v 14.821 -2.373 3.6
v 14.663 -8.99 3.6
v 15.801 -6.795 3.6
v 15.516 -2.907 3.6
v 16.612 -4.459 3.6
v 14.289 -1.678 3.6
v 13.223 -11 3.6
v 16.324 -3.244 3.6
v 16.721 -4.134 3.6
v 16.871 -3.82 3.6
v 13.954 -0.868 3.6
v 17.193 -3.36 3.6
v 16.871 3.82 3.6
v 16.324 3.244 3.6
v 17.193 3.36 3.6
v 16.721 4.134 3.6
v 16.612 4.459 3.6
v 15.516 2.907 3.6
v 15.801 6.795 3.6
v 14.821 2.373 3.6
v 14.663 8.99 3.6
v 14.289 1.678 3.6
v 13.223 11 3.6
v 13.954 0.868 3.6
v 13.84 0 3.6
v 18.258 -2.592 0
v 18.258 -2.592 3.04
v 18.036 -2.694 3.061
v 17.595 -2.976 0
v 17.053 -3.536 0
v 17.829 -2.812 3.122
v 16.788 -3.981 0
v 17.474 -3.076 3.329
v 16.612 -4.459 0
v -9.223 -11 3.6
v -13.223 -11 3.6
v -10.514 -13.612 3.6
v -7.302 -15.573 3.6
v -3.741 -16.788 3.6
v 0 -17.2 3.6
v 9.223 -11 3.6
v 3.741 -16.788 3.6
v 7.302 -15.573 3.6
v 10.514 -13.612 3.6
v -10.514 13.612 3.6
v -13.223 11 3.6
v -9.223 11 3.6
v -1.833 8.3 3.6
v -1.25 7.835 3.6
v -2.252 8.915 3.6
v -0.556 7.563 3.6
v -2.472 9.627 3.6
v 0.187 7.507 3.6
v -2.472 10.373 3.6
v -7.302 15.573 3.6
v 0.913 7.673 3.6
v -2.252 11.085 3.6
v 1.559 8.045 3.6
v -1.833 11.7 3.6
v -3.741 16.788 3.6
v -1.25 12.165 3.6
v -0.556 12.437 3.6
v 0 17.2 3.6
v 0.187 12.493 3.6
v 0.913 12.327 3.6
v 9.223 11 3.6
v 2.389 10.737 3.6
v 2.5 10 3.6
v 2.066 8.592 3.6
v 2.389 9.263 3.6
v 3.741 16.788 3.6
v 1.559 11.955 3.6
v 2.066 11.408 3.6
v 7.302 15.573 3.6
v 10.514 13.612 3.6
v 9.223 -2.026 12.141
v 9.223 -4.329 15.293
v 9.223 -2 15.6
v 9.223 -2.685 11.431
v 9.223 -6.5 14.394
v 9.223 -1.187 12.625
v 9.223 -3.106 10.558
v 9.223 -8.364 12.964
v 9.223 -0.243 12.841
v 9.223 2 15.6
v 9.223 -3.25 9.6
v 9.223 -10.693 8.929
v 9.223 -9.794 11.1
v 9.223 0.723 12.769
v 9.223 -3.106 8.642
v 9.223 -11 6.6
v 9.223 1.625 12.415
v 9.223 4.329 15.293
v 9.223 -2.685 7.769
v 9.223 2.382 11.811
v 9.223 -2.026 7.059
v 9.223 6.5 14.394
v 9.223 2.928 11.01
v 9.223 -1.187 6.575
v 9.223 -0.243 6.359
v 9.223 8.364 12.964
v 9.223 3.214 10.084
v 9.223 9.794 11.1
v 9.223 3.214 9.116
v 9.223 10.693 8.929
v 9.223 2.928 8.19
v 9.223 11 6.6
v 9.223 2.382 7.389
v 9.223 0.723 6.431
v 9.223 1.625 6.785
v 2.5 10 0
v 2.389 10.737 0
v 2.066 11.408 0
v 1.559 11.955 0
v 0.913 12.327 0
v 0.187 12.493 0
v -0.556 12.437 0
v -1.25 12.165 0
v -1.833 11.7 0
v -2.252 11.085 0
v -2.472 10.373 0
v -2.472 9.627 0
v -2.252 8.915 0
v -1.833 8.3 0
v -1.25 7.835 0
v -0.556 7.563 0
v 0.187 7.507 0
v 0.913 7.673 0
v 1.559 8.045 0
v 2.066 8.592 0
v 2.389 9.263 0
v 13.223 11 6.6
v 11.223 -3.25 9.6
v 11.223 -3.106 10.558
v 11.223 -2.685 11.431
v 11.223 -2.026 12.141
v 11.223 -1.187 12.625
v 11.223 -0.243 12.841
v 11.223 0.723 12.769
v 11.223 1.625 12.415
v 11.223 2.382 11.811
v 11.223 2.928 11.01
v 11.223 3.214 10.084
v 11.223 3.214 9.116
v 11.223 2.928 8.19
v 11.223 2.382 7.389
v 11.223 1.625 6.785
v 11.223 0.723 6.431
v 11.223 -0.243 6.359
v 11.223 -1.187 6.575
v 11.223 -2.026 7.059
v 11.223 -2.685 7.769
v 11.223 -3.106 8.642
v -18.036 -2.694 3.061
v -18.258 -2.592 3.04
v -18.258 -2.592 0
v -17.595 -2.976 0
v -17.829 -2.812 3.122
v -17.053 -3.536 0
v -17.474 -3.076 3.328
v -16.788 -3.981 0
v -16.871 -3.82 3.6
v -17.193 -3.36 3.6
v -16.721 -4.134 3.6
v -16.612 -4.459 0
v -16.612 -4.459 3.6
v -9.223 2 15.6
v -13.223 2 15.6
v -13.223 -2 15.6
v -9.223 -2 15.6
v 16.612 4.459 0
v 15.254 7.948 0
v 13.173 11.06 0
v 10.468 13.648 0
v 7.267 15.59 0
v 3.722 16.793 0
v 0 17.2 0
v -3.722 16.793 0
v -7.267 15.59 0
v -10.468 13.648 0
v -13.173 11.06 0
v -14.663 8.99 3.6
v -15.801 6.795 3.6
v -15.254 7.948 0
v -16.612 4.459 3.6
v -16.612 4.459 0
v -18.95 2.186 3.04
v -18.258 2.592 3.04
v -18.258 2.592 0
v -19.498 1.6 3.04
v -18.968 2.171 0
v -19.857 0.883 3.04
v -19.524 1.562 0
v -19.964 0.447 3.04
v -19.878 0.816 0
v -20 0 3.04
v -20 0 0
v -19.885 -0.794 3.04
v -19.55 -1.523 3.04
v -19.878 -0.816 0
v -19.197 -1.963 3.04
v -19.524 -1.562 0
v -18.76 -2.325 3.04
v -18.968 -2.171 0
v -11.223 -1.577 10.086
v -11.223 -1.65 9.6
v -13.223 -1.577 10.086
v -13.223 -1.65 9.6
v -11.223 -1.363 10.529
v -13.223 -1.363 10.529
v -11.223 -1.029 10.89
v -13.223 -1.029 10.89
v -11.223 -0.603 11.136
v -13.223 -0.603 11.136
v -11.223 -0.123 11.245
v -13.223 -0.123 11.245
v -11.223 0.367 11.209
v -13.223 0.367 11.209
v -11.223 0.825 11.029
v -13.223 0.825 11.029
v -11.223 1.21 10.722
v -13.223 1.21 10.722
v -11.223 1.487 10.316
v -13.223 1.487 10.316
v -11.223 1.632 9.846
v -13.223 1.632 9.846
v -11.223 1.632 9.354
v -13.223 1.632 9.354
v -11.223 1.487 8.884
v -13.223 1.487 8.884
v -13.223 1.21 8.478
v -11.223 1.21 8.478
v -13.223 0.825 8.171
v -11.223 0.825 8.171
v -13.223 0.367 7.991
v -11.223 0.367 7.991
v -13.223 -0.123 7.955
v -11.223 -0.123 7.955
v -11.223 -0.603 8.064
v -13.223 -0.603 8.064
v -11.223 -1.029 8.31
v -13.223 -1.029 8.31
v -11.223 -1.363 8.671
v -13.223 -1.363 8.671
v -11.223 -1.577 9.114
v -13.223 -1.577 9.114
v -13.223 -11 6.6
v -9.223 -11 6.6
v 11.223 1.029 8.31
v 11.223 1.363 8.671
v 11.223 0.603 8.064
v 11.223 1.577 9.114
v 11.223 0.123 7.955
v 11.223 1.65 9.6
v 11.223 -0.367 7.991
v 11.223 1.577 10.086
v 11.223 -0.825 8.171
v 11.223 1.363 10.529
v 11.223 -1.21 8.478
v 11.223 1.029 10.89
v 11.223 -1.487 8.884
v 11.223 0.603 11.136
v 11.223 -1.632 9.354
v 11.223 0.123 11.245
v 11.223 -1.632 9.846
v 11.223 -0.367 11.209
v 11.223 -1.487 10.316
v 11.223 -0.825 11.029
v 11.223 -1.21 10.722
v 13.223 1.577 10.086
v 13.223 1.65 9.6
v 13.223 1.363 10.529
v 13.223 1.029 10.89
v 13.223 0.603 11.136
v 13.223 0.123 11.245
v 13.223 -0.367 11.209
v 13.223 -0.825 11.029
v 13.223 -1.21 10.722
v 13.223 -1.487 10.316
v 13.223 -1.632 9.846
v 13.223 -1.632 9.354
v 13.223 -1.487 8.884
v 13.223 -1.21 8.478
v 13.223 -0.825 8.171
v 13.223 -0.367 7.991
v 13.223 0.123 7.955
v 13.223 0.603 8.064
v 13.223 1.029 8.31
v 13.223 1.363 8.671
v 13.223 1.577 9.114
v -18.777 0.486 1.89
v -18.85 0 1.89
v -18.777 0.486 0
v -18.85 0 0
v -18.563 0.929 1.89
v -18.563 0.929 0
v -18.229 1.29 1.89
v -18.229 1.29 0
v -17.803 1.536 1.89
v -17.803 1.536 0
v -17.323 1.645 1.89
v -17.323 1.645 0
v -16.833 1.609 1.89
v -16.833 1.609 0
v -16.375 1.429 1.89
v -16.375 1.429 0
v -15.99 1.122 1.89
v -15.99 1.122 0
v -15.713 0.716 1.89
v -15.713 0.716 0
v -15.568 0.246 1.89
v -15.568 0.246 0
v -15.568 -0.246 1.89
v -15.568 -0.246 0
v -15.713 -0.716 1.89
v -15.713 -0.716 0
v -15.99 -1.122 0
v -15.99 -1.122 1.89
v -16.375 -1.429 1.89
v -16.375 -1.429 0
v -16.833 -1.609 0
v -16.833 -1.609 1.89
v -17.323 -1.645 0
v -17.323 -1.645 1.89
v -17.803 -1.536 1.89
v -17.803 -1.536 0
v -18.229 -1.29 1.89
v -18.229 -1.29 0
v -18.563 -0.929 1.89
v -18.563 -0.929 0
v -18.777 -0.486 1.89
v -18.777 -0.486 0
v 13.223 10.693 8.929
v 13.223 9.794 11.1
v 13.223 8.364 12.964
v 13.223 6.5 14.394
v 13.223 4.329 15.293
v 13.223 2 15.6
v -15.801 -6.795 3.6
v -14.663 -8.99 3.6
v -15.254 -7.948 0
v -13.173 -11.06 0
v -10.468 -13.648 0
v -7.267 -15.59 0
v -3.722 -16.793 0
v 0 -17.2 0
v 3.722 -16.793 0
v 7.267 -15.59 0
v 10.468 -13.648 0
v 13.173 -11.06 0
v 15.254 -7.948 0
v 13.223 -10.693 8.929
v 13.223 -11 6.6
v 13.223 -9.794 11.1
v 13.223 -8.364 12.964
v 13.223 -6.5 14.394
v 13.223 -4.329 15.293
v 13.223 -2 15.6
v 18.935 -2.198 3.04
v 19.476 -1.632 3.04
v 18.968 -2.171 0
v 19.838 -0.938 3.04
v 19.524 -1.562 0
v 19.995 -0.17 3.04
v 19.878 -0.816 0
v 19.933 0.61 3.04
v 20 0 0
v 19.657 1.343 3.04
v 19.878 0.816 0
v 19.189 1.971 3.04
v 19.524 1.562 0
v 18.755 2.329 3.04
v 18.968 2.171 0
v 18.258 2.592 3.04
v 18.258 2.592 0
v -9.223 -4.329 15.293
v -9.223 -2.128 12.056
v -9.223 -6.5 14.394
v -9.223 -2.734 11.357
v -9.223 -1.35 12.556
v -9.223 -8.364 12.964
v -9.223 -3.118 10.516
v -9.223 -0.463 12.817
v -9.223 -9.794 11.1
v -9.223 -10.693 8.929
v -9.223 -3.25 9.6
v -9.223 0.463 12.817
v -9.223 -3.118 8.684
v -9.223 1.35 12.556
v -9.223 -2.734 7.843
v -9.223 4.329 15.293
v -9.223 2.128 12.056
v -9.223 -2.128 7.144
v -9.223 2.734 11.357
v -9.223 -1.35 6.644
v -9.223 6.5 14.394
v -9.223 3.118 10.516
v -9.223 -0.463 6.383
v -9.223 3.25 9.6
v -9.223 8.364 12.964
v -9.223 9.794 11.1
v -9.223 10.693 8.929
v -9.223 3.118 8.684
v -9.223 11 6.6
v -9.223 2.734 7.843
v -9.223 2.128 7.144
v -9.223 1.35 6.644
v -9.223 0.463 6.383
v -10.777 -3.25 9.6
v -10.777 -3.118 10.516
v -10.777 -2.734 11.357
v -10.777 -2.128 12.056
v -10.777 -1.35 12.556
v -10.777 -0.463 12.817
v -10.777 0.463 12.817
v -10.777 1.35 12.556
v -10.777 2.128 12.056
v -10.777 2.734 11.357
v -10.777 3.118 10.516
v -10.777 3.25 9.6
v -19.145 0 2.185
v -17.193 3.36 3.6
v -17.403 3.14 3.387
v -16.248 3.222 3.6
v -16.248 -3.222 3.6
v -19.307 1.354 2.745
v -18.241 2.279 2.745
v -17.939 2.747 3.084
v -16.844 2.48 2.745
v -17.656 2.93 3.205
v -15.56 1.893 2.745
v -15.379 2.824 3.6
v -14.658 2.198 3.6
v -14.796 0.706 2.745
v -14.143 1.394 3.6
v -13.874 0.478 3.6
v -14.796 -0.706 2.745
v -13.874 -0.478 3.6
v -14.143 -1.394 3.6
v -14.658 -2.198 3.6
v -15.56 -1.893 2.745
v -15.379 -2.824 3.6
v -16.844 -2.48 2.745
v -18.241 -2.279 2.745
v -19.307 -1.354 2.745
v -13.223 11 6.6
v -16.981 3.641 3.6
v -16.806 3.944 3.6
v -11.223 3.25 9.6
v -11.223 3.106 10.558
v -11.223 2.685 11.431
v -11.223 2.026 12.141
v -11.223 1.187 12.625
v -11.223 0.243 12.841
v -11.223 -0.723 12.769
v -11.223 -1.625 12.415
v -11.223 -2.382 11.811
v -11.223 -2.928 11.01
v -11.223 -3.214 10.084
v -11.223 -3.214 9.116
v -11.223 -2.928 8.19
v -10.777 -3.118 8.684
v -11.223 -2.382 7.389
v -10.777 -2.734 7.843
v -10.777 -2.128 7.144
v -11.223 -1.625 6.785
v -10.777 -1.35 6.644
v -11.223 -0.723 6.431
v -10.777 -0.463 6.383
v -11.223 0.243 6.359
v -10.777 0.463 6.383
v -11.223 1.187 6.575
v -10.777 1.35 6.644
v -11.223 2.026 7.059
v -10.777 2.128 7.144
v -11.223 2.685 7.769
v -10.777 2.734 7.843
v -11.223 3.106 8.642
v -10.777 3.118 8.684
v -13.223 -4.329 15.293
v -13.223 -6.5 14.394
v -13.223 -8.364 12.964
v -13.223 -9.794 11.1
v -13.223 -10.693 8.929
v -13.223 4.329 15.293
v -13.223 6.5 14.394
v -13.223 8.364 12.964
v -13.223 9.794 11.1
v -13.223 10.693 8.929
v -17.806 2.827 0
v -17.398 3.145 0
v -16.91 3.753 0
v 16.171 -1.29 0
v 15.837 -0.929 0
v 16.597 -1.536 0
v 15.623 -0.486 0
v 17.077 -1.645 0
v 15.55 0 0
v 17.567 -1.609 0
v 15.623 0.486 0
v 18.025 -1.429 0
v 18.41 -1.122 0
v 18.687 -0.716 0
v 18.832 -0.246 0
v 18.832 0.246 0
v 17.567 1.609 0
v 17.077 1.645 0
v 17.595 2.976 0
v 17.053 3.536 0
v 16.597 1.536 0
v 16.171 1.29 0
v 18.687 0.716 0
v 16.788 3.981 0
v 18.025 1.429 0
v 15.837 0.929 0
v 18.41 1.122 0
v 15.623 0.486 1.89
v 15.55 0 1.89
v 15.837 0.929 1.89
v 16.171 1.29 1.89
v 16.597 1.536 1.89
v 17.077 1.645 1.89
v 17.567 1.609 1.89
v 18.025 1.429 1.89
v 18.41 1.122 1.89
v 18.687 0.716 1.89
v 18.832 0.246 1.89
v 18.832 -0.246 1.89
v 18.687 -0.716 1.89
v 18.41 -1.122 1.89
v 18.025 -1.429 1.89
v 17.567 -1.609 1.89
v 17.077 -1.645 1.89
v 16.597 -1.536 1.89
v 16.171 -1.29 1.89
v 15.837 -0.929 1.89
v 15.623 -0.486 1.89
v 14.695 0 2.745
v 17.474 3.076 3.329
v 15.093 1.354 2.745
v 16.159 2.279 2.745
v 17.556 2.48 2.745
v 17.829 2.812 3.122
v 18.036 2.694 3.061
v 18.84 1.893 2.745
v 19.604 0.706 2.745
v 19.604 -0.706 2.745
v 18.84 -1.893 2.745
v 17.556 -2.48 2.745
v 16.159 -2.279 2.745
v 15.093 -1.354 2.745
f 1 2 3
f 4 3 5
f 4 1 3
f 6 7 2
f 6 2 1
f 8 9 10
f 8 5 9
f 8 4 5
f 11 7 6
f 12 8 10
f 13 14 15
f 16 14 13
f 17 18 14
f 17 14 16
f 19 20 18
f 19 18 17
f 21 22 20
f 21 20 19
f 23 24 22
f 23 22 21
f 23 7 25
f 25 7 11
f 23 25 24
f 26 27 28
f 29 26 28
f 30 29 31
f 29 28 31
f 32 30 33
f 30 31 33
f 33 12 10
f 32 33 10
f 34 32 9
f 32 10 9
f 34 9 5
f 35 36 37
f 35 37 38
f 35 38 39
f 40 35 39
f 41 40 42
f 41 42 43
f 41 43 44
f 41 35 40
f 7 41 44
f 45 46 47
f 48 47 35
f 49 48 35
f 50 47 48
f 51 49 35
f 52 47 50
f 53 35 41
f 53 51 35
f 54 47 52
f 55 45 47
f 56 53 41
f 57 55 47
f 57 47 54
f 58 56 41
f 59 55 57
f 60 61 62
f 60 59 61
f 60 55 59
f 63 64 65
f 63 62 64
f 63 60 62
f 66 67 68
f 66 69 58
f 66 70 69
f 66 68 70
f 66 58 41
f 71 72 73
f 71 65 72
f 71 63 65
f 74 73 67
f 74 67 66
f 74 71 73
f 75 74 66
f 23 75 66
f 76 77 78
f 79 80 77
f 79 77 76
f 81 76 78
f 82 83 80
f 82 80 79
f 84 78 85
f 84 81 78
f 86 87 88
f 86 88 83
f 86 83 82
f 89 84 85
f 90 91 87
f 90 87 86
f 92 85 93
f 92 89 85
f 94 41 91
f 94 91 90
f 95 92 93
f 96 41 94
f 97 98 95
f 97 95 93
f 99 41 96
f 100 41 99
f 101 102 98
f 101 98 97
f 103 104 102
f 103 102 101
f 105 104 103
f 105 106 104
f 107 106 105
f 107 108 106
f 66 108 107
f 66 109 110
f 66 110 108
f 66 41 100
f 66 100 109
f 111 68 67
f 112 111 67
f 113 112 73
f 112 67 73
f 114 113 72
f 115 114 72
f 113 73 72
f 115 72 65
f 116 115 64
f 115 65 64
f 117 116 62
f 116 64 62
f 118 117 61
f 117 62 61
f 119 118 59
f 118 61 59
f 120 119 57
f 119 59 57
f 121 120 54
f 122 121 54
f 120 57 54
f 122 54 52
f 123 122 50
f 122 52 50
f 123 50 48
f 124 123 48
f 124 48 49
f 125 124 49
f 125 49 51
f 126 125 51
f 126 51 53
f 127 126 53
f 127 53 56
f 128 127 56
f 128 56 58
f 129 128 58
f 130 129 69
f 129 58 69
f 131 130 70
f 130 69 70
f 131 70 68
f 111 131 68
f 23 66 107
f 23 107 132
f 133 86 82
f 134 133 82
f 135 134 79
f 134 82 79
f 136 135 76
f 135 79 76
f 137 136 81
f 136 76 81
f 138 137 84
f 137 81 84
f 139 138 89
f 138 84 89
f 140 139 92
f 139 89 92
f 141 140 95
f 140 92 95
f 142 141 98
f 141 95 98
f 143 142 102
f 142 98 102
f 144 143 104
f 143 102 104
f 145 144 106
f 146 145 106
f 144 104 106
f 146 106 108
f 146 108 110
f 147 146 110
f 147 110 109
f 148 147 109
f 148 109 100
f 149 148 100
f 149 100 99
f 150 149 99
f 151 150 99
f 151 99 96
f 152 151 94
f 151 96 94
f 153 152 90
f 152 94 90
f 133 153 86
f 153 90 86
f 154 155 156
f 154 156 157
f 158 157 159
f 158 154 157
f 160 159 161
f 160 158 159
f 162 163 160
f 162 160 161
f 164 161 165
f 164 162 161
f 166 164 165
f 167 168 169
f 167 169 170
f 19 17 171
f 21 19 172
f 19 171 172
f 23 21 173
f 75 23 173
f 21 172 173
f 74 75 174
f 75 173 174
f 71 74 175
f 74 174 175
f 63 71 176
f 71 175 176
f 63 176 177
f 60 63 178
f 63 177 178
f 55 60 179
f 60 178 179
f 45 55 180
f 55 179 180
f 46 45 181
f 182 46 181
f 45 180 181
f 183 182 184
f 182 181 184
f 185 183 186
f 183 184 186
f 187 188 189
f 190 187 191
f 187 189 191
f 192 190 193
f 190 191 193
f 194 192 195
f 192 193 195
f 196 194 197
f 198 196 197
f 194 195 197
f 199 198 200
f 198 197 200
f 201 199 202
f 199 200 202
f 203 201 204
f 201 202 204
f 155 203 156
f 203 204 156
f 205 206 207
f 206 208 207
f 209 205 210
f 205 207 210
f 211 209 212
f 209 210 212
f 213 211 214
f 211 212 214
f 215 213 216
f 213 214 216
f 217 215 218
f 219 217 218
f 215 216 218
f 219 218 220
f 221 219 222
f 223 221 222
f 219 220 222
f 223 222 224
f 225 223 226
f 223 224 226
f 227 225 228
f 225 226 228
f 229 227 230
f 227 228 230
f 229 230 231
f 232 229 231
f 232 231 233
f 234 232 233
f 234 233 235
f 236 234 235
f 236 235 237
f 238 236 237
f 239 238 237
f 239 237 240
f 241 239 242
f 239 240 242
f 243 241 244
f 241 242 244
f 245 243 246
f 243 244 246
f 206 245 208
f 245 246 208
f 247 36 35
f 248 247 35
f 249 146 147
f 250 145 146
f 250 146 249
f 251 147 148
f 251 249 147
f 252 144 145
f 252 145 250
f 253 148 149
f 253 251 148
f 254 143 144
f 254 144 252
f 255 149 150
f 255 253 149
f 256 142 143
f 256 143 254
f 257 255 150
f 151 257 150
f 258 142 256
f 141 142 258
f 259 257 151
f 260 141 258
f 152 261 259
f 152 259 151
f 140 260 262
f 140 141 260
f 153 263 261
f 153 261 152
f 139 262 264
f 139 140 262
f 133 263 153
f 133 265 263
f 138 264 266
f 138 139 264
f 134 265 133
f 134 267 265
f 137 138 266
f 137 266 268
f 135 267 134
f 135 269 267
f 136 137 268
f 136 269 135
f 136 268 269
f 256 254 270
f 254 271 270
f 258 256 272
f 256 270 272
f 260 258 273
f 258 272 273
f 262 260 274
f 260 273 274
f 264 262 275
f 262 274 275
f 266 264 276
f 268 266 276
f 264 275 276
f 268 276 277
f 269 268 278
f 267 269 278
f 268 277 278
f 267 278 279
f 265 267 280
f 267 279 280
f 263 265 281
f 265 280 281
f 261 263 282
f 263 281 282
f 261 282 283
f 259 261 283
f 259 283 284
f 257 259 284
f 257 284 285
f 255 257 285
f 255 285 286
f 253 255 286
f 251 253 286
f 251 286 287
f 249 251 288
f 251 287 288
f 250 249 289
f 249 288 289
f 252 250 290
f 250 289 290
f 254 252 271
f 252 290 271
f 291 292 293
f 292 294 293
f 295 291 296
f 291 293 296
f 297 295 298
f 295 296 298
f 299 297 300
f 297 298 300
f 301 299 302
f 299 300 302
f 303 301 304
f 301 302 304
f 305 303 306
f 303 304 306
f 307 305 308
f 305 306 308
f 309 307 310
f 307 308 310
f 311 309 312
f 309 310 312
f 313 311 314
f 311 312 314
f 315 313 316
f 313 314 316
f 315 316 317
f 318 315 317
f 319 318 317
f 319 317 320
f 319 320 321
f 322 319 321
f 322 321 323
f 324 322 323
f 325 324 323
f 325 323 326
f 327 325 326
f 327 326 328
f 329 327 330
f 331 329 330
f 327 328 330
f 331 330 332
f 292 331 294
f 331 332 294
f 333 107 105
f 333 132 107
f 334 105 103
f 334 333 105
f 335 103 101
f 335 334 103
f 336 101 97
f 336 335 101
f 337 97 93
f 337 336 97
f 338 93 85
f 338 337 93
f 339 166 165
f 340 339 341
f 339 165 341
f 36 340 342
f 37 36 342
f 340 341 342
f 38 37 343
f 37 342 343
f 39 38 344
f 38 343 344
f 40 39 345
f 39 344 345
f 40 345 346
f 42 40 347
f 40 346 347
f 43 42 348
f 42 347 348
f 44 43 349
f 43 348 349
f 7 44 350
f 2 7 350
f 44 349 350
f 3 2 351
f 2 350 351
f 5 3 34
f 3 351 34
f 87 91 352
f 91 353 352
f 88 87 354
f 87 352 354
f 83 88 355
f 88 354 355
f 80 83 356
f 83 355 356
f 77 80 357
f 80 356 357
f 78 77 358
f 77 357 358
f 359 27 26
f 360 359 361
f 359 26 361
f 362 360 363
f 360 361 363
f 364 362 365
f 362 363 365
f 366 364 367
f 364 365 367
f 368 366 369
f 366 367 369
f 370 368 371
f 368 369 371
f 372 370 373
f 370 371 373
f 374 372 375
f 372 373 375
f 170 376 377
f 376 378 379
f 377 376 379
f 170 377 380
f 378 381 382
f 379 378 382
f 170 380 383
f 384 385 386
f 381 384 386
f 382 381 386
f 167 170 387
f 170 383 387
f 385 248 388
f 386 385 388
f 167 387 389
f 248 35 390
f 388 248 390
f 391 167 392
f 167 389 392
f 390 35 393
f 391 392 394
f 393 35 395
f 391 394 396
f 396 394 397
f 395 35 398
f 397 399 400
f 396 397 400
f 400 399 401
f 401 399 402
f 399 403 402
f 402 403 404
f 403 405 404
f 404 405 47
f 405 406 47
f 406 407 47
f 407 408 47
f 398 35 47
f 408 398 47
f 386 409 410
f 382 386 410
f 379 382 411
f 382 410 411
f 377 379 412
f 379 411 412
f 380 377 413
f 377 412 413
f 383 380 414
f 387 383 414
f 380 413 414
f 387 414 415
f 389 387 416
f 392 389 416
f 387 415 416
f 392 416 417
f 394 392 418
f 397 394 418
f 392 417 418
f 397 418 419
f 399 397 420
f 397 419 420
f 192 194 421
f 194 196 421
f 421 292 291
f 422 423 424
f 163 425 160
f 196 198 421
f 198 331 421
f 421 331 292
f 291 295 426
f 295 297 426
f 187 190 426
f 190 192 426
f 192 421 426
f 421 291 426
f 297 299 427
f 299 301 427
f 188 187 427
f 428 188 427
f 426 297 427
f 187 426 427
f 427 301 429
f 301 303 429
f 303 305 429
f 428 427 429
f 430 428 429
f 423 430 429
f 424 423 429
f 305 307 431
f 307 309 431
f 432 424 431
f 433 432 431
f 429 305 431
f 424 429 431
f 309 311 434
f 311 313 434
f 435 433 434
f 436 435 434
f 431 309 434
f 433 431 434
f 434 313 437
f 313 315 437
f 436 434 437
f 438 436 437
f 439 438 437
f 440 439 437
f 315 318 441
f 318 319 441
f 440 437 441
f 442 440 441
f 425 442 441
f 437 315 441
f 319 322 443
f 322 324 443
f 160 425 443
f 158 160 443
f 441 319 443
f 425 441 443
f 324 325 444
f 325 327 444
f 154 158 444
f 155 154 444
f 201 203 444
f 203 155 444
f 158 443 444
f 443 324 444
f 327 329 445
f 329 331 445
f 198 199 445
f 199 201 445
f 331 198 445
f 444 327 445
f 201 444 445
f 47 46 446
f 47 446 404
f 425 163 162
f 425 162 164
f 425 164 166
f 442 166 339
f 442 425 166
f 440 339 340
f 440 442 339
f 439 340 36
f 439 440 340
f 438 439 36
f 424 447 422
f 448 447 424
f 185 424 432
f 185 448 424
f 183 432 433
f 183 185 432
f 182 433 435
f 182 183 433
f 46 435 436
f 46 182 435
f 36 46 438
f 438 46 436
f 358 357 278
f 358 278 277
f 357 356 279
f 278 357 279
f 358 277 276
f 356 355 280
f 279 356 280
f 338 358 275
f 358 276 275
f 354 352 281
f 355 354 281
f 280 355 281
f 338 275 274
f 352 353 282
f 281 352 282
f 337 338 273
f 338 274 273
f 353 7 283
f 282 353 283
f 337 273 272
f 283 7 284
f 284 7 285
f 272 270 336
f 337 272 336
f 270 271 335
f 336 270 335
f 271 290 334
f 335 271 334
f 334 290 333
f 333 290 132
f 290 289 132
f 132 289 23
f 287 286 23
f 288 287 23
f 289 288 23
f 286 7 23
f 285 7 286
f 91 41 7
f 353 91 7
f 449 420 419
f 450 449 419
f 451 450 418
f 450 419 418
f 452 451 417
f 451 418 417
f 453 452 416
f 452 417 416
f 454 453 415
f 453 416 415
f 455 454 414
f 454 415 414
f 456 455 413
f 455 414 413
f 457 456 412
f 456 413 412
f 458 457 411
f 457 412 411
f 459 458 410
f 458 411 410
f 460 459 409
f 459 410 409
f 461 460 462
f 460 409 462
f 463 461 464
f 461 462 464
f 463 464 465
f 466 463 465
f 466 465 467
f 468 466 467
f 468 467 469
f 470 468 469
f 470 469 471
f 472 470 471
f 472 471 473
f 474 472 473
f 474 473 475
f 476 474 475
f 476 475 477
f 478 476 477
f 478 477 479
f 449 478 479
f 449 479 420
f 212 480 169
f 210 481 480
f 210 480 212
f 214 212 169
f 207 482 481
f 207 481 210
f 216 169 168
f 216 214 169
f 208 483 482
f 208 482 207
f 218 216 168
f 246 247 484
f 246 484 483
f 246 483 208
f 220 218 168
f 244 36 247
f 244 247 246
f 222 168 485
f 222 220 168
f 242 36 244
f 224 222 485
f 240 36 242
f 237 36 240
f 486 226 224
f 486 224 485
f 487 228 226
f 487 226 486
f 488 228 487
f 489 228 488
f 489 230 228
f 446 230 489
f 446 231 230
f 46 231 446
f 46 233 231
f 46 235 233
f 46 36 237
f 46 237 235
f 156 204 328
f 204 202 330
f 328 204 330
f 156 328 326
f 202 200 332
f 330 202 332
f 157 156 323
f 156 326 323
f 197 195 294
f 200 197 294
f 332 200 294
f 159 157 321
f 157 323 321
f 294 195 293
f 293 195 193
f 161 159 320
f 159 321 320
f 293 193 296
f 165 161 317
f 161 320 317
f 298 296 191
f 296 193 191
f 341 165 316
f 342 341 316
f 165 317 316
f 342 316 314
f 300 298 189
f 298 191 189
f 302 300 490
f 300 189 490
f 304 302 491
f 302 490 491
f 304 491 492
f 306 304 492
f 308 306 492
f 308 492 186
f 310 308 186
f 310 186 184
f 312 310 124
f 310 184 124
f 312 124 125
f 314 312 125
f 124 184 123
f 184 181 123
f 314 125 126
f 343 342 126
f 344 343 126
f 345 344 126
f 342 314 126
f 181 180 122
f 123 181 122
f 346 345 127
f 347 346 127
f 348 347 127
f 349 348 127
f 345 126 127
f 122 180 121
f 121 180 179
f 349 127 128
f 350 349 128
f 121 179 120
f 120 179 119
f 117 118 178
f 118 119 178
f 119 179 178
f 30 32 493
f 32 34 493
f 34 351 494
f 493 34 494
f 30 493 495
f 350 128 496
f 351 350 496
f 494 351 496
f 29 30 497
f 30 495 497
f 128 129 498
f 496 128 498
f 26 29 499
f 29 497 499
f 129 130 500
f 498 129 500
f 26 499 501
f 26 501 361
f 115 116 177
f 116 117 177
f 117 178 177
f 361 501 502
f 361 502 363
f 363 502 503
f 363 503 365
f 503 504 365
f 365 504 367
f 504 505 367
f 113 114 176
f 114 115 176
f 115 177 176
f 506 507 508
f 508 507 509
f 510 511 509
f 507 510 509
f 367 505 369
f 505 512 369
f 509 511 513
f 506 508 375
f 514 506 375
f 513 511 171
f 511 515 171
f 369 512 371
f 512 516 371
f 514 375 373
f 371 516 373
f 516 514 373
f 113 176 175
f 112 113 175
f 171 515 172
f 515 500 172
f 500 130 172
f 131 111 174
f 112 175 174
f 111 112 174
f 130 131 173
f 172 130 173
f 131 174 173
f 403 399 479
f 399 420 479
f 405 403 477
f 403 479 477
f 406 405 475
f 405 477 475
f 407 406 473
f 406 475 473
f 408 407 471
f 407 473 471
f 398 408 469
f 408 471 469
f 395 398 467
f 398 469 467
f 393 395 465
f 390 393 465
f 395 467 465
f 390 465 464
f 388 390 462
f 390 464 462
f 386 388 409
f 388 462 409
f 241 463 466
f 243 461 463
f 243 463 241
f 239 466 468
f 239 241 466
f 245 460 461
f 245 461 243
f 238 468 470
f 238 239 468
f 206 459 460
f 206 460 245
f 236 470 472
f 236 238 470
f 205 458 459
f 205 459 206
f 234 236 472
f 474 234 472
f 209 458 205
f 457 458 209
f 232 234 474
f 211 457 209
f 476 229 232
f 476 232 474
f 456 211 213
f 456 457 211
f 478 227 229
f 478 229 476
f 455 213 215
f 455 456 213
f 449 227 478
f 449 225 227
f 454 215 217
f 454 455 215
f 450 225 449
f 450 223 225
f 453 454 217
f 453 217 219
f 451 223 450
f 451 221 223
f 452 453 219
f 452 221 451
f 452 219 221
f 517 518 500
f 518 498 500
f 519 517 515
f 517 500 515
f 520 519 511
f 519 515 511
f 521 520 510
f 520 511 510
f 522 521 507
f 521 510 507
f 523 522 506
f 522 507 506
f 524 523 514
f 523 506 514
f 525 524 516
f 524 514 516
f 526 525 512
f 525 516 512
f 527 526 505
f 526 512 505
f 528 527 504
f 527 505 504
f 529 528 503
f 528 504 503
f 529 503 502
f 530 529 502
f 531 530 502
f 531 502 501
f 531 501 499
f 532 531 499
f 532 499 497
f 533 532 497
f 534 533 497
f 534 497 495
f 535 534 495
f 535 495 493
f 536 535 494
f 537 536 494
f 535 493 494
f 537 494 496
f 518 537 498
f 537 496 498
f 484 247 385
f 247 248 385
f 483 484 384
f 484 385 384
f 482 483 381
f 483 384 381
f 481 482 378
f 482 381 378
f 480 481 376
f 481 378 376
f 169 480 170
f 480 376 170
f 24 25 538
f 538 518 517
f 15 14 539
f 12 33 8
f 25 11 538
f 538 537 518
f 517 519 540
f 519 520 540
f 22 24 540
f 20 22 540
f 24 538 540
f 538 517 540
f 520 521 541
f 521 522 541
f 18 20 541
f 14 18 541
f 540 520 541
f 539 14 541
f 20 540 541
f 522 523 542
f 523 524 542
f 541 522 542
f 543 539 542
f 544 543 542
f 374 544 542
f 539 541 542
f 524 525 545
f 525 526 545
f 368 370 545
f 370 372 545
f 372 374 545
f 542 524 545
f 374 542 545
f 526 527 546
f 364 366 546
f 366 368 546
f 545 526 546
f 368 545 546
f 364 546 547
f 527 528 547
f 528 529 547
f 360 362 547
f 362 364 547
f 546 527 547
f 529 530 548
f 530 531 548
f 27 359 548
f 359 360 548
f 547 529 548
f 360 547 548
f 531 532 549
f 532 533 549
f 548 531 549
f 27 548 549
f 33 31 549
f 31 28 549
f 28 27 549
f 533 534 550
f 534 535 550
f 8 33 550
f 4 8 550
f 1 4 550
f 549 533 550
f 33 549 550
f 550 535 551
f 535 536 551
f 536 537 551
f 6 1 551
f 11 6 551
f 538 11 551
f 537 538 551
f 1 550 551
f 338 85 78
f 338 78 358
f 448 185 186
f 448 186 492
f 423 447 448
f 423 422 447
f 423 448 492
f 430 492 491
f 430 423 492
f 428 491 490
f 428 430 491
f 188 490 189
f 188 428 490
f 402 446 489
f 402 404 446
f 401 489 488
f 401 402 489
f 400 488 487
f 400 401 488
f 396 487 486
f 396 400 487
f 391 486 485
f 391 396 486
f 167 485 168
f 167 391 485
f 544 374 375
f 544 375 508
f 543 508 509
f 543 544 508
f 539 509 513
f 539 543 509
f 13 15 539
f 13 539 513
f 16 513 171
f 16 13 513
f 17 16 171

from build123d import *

# Parameters (mm, degrees)
F1_DEPTH             = 3.6
F2_R                 = 2.8
F4_D                 = 3.3
F4_DEPTH             = 20
F4_CSINK_D           = 6.72
F4_CSINK_ANGLE       = 90
F4_TIP               = 0.9914200214
F3_R                 = 2.5
F5_DEPTH             = 3.6
F3_W                 = 4
F3_H                 = 22
F6_DEPTH             = 12
F9_D                 = 3.3
F9_DEPTH             = 20
F9_CBORE_D           = 6.5
F9_CBORE_DEPTH       = 2
F9_TIP               = 0.9914200214
F9_ON_F7_D           = 3.3
F9_ON_F7_DEPTH       = 20
F9_ON_F7_CBORE_D     = 6.5
F9_ON_F7_CBORE_DEPTH = 2
F9_ON_F7_TIP         = 0.9914200214
F10_R                = 9


with BuildPart() as f1:
    # F0 (on Top) → F1 (new body)
    with BuildSketch(Plane.XY):
        with BuildLine():
            ThreePointArc((16.9720930233, -2.7907093023), (20, 0), (16.9720930233, 2.7907093023))
            ThreePointArc((16.9720930233, 2.7907093023), (0, 17.2), (-16.9720930233, 2.7907093023))
            ThreePointArc((-16.9720930233, 2.7907093023), (-20, 0), (-16.9720930233, -2.7907093023))
            ThreePointArc((-16.9720930233, -2.7907093023), (0, -17.2), (16.9720930233, -2.7907093023))
        make_face()
    extrude(amount=F1_DEPTH)

    # F2
    f2_edges = [f1.edges().sort_by_distance(p)[0] for p in [
        (-16.972093, -2.790709, 1.8),
        (16.972093, -2.790709, 1.8),
        (16.972093, 2.790709, 1.8),
        (-16.972093, 2.790709, 1.8),
    ]]
    fillet(f2_edges, radius=F2_R)

    # F4
    with Locations(Plane.XY.offset(3.6)):
        with Locations((-17.2, 0), (17.2, 0)):
            CounterSinkHole(F4_D / 2, F4_CSINK_D / 2, depth=F4_DEPTH, counter_sink_angle=F4_CSINK_ANGLE)
            with Locations((0, 0, -(F4_DEPTH + F4_TIP / 2))):  # 118° drill point
                Cone(0, F4_D / 2, F4_TIP, mode=Mode.SUBTRACT)

    # F3 (on face) → F5 (cut, through all)
    with BuildSketch(Plane.XY.offset(3.6)):
        with Locations((0, 10)):
            Circle(F3_R)
    extrude(amount=-F5_DEPTH, mode=Mode.SUBTRACT)

    # F3 (on face) → F6 (join)
    with BuildSketch(Plane.XY.offset(3.6)):
        with Locations((-11.2227077409, 0)):
            Rectangle(F3_W, F3_H)
        with Locations((11.2227077409, 0)):
            Rectangle(F3_W, F3_H)
    extrude(amount=F6_DEPTH)

    # F9
    with Locations(Plane(origin=(9.2227077409, 0, 0), x_dir=(0, -1, 0), z_dir=(-1, 0, 0))):
        with Locations((0, 9.6)):
            CounterBoreHole(F9_D / 2, F9_CBORE_D / 2, F9_CBORE_DEPTH, depth=F9_DEPTH)
            with Locations((0, 0, -(F9_DEPTH + F9_TIP / 2))):  # 118° drill point
                Cone(0, F9_D / 2, F9_TIP, mode=Mode.SUBTRACT)

    # F9 on F7
    with Locations(Plane.YZ.offset(-9.2227077409)):
        with Locations((0, 9.6)):
            CounterBoreHole(F9_ON_F7_D / 2, F9_ON_F7_CBORE_D / 2, F9_ON_F7_CBORE_DEPTH, depth=F9_ON_F7_DEPTH)
            with Locations((0, 0, -(F9_ON_F7_DEPTH + F9_ON_F7_TIP / 2))):  # 118° drill point
                Cone(0, F9_ON_F7_D / 2, F9_ON_F7_TIP, mode=Mode.SUBTRACT)

    # F10
    f10_edges = [f1.edges().sort_by_distance(p)[0] for p in [
        (11.222708, 11, 15.6),
        (-11.222708, 11, 15.6),
        (-11.222708, -11, 15.6),
        (11.222708, -11, 15.6),
    ]]
    fillet(f10_edges, radius=F10_R)


solid = f1.part
